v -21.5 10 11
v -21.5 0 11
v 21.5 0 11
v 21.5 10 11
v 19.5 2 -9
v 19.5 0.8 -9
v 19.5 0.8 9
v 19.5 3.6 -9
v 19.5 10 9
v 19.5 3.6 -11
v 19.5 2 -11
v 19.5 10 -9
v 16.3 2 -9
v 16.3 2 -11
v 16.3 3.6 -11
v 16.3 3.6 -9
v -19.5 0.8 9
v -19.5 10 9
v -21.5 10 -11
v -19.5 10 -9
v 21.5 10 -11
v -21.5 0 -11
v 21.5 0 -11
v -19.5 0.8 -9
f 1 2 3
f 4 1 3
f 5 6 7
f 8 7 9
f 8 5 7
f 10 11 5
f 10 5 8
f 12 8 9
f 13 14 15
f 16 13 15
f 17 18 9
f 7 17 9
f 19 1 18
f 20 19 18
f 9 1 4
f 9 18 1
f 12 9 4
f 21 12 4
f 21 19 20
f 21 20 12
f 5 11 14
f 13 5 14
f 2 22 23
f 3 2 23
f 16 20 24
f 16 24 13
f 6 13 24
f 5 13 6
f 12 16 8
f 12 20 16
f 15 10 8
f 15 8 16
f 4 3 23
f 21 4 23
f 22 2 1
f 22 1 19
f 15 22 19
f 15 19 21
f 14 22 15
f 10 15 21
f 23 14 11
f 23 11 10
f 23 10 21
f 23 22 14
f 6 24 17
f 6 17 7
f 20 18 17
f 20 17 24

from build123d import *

# Parameters (mm, degrees)
SKETCH_1_W          = 43
SKETCH_1_H          = 22
EXTRUDE_2_DEPTH     = 10
SKETCH_3_W          = 39
SKETCH_3_H          = 18
CUT_EXTRUDE_1_DEPTH = 9.2
SKETCH_4_W          = 3.2
SKETCH_4_H          = 1.6
CUT_EXTRUDE_2_DEPTH = 2


with BuildPart() as part:
    # Эскиз1 → Бобышка-Вытянуть2 (new body)
    with BuildSketch(Plane(origin=(0, 0, 0), x_dir=(1, 0, 0), z_dir=(0, 1, 0))):
        Rectangle(SKETCH_1_W, SKETCH_1_H)
    extrude(amount=EXTRUDE_2_DEPTH)

    # Эскиз3 → Вырез-Вытянуть1 (cut)
    with BuildSketch(Plane(origin=(0, 10, 0), x_dir=(1, 0, 0), z_dir=(0, 1, 0))):
        Rectangle(SKETCH_3_W, SKETCH_3_H)
    extrude(amount=-CUT_EXTRUDE_1_DEPTH, mode=Mode.SUBTRACT)

    # Эскиз4 → Вырез-Вытянуть2 (cut)
    with BuildSketch(Plane(origin=(0, 0, -11), x_dir=(-1, 0, 0), z_dir=(0, 0, -1))):
        with Locations((-17.9, 2.8)):
            Rectangle(SKETCH_4_W, SKETCH_4_H)
    extrude(amount=-CUT_EXTRUDE_2_DEPTH, mode=Mode.SUBTRACT)


solid = part.part
